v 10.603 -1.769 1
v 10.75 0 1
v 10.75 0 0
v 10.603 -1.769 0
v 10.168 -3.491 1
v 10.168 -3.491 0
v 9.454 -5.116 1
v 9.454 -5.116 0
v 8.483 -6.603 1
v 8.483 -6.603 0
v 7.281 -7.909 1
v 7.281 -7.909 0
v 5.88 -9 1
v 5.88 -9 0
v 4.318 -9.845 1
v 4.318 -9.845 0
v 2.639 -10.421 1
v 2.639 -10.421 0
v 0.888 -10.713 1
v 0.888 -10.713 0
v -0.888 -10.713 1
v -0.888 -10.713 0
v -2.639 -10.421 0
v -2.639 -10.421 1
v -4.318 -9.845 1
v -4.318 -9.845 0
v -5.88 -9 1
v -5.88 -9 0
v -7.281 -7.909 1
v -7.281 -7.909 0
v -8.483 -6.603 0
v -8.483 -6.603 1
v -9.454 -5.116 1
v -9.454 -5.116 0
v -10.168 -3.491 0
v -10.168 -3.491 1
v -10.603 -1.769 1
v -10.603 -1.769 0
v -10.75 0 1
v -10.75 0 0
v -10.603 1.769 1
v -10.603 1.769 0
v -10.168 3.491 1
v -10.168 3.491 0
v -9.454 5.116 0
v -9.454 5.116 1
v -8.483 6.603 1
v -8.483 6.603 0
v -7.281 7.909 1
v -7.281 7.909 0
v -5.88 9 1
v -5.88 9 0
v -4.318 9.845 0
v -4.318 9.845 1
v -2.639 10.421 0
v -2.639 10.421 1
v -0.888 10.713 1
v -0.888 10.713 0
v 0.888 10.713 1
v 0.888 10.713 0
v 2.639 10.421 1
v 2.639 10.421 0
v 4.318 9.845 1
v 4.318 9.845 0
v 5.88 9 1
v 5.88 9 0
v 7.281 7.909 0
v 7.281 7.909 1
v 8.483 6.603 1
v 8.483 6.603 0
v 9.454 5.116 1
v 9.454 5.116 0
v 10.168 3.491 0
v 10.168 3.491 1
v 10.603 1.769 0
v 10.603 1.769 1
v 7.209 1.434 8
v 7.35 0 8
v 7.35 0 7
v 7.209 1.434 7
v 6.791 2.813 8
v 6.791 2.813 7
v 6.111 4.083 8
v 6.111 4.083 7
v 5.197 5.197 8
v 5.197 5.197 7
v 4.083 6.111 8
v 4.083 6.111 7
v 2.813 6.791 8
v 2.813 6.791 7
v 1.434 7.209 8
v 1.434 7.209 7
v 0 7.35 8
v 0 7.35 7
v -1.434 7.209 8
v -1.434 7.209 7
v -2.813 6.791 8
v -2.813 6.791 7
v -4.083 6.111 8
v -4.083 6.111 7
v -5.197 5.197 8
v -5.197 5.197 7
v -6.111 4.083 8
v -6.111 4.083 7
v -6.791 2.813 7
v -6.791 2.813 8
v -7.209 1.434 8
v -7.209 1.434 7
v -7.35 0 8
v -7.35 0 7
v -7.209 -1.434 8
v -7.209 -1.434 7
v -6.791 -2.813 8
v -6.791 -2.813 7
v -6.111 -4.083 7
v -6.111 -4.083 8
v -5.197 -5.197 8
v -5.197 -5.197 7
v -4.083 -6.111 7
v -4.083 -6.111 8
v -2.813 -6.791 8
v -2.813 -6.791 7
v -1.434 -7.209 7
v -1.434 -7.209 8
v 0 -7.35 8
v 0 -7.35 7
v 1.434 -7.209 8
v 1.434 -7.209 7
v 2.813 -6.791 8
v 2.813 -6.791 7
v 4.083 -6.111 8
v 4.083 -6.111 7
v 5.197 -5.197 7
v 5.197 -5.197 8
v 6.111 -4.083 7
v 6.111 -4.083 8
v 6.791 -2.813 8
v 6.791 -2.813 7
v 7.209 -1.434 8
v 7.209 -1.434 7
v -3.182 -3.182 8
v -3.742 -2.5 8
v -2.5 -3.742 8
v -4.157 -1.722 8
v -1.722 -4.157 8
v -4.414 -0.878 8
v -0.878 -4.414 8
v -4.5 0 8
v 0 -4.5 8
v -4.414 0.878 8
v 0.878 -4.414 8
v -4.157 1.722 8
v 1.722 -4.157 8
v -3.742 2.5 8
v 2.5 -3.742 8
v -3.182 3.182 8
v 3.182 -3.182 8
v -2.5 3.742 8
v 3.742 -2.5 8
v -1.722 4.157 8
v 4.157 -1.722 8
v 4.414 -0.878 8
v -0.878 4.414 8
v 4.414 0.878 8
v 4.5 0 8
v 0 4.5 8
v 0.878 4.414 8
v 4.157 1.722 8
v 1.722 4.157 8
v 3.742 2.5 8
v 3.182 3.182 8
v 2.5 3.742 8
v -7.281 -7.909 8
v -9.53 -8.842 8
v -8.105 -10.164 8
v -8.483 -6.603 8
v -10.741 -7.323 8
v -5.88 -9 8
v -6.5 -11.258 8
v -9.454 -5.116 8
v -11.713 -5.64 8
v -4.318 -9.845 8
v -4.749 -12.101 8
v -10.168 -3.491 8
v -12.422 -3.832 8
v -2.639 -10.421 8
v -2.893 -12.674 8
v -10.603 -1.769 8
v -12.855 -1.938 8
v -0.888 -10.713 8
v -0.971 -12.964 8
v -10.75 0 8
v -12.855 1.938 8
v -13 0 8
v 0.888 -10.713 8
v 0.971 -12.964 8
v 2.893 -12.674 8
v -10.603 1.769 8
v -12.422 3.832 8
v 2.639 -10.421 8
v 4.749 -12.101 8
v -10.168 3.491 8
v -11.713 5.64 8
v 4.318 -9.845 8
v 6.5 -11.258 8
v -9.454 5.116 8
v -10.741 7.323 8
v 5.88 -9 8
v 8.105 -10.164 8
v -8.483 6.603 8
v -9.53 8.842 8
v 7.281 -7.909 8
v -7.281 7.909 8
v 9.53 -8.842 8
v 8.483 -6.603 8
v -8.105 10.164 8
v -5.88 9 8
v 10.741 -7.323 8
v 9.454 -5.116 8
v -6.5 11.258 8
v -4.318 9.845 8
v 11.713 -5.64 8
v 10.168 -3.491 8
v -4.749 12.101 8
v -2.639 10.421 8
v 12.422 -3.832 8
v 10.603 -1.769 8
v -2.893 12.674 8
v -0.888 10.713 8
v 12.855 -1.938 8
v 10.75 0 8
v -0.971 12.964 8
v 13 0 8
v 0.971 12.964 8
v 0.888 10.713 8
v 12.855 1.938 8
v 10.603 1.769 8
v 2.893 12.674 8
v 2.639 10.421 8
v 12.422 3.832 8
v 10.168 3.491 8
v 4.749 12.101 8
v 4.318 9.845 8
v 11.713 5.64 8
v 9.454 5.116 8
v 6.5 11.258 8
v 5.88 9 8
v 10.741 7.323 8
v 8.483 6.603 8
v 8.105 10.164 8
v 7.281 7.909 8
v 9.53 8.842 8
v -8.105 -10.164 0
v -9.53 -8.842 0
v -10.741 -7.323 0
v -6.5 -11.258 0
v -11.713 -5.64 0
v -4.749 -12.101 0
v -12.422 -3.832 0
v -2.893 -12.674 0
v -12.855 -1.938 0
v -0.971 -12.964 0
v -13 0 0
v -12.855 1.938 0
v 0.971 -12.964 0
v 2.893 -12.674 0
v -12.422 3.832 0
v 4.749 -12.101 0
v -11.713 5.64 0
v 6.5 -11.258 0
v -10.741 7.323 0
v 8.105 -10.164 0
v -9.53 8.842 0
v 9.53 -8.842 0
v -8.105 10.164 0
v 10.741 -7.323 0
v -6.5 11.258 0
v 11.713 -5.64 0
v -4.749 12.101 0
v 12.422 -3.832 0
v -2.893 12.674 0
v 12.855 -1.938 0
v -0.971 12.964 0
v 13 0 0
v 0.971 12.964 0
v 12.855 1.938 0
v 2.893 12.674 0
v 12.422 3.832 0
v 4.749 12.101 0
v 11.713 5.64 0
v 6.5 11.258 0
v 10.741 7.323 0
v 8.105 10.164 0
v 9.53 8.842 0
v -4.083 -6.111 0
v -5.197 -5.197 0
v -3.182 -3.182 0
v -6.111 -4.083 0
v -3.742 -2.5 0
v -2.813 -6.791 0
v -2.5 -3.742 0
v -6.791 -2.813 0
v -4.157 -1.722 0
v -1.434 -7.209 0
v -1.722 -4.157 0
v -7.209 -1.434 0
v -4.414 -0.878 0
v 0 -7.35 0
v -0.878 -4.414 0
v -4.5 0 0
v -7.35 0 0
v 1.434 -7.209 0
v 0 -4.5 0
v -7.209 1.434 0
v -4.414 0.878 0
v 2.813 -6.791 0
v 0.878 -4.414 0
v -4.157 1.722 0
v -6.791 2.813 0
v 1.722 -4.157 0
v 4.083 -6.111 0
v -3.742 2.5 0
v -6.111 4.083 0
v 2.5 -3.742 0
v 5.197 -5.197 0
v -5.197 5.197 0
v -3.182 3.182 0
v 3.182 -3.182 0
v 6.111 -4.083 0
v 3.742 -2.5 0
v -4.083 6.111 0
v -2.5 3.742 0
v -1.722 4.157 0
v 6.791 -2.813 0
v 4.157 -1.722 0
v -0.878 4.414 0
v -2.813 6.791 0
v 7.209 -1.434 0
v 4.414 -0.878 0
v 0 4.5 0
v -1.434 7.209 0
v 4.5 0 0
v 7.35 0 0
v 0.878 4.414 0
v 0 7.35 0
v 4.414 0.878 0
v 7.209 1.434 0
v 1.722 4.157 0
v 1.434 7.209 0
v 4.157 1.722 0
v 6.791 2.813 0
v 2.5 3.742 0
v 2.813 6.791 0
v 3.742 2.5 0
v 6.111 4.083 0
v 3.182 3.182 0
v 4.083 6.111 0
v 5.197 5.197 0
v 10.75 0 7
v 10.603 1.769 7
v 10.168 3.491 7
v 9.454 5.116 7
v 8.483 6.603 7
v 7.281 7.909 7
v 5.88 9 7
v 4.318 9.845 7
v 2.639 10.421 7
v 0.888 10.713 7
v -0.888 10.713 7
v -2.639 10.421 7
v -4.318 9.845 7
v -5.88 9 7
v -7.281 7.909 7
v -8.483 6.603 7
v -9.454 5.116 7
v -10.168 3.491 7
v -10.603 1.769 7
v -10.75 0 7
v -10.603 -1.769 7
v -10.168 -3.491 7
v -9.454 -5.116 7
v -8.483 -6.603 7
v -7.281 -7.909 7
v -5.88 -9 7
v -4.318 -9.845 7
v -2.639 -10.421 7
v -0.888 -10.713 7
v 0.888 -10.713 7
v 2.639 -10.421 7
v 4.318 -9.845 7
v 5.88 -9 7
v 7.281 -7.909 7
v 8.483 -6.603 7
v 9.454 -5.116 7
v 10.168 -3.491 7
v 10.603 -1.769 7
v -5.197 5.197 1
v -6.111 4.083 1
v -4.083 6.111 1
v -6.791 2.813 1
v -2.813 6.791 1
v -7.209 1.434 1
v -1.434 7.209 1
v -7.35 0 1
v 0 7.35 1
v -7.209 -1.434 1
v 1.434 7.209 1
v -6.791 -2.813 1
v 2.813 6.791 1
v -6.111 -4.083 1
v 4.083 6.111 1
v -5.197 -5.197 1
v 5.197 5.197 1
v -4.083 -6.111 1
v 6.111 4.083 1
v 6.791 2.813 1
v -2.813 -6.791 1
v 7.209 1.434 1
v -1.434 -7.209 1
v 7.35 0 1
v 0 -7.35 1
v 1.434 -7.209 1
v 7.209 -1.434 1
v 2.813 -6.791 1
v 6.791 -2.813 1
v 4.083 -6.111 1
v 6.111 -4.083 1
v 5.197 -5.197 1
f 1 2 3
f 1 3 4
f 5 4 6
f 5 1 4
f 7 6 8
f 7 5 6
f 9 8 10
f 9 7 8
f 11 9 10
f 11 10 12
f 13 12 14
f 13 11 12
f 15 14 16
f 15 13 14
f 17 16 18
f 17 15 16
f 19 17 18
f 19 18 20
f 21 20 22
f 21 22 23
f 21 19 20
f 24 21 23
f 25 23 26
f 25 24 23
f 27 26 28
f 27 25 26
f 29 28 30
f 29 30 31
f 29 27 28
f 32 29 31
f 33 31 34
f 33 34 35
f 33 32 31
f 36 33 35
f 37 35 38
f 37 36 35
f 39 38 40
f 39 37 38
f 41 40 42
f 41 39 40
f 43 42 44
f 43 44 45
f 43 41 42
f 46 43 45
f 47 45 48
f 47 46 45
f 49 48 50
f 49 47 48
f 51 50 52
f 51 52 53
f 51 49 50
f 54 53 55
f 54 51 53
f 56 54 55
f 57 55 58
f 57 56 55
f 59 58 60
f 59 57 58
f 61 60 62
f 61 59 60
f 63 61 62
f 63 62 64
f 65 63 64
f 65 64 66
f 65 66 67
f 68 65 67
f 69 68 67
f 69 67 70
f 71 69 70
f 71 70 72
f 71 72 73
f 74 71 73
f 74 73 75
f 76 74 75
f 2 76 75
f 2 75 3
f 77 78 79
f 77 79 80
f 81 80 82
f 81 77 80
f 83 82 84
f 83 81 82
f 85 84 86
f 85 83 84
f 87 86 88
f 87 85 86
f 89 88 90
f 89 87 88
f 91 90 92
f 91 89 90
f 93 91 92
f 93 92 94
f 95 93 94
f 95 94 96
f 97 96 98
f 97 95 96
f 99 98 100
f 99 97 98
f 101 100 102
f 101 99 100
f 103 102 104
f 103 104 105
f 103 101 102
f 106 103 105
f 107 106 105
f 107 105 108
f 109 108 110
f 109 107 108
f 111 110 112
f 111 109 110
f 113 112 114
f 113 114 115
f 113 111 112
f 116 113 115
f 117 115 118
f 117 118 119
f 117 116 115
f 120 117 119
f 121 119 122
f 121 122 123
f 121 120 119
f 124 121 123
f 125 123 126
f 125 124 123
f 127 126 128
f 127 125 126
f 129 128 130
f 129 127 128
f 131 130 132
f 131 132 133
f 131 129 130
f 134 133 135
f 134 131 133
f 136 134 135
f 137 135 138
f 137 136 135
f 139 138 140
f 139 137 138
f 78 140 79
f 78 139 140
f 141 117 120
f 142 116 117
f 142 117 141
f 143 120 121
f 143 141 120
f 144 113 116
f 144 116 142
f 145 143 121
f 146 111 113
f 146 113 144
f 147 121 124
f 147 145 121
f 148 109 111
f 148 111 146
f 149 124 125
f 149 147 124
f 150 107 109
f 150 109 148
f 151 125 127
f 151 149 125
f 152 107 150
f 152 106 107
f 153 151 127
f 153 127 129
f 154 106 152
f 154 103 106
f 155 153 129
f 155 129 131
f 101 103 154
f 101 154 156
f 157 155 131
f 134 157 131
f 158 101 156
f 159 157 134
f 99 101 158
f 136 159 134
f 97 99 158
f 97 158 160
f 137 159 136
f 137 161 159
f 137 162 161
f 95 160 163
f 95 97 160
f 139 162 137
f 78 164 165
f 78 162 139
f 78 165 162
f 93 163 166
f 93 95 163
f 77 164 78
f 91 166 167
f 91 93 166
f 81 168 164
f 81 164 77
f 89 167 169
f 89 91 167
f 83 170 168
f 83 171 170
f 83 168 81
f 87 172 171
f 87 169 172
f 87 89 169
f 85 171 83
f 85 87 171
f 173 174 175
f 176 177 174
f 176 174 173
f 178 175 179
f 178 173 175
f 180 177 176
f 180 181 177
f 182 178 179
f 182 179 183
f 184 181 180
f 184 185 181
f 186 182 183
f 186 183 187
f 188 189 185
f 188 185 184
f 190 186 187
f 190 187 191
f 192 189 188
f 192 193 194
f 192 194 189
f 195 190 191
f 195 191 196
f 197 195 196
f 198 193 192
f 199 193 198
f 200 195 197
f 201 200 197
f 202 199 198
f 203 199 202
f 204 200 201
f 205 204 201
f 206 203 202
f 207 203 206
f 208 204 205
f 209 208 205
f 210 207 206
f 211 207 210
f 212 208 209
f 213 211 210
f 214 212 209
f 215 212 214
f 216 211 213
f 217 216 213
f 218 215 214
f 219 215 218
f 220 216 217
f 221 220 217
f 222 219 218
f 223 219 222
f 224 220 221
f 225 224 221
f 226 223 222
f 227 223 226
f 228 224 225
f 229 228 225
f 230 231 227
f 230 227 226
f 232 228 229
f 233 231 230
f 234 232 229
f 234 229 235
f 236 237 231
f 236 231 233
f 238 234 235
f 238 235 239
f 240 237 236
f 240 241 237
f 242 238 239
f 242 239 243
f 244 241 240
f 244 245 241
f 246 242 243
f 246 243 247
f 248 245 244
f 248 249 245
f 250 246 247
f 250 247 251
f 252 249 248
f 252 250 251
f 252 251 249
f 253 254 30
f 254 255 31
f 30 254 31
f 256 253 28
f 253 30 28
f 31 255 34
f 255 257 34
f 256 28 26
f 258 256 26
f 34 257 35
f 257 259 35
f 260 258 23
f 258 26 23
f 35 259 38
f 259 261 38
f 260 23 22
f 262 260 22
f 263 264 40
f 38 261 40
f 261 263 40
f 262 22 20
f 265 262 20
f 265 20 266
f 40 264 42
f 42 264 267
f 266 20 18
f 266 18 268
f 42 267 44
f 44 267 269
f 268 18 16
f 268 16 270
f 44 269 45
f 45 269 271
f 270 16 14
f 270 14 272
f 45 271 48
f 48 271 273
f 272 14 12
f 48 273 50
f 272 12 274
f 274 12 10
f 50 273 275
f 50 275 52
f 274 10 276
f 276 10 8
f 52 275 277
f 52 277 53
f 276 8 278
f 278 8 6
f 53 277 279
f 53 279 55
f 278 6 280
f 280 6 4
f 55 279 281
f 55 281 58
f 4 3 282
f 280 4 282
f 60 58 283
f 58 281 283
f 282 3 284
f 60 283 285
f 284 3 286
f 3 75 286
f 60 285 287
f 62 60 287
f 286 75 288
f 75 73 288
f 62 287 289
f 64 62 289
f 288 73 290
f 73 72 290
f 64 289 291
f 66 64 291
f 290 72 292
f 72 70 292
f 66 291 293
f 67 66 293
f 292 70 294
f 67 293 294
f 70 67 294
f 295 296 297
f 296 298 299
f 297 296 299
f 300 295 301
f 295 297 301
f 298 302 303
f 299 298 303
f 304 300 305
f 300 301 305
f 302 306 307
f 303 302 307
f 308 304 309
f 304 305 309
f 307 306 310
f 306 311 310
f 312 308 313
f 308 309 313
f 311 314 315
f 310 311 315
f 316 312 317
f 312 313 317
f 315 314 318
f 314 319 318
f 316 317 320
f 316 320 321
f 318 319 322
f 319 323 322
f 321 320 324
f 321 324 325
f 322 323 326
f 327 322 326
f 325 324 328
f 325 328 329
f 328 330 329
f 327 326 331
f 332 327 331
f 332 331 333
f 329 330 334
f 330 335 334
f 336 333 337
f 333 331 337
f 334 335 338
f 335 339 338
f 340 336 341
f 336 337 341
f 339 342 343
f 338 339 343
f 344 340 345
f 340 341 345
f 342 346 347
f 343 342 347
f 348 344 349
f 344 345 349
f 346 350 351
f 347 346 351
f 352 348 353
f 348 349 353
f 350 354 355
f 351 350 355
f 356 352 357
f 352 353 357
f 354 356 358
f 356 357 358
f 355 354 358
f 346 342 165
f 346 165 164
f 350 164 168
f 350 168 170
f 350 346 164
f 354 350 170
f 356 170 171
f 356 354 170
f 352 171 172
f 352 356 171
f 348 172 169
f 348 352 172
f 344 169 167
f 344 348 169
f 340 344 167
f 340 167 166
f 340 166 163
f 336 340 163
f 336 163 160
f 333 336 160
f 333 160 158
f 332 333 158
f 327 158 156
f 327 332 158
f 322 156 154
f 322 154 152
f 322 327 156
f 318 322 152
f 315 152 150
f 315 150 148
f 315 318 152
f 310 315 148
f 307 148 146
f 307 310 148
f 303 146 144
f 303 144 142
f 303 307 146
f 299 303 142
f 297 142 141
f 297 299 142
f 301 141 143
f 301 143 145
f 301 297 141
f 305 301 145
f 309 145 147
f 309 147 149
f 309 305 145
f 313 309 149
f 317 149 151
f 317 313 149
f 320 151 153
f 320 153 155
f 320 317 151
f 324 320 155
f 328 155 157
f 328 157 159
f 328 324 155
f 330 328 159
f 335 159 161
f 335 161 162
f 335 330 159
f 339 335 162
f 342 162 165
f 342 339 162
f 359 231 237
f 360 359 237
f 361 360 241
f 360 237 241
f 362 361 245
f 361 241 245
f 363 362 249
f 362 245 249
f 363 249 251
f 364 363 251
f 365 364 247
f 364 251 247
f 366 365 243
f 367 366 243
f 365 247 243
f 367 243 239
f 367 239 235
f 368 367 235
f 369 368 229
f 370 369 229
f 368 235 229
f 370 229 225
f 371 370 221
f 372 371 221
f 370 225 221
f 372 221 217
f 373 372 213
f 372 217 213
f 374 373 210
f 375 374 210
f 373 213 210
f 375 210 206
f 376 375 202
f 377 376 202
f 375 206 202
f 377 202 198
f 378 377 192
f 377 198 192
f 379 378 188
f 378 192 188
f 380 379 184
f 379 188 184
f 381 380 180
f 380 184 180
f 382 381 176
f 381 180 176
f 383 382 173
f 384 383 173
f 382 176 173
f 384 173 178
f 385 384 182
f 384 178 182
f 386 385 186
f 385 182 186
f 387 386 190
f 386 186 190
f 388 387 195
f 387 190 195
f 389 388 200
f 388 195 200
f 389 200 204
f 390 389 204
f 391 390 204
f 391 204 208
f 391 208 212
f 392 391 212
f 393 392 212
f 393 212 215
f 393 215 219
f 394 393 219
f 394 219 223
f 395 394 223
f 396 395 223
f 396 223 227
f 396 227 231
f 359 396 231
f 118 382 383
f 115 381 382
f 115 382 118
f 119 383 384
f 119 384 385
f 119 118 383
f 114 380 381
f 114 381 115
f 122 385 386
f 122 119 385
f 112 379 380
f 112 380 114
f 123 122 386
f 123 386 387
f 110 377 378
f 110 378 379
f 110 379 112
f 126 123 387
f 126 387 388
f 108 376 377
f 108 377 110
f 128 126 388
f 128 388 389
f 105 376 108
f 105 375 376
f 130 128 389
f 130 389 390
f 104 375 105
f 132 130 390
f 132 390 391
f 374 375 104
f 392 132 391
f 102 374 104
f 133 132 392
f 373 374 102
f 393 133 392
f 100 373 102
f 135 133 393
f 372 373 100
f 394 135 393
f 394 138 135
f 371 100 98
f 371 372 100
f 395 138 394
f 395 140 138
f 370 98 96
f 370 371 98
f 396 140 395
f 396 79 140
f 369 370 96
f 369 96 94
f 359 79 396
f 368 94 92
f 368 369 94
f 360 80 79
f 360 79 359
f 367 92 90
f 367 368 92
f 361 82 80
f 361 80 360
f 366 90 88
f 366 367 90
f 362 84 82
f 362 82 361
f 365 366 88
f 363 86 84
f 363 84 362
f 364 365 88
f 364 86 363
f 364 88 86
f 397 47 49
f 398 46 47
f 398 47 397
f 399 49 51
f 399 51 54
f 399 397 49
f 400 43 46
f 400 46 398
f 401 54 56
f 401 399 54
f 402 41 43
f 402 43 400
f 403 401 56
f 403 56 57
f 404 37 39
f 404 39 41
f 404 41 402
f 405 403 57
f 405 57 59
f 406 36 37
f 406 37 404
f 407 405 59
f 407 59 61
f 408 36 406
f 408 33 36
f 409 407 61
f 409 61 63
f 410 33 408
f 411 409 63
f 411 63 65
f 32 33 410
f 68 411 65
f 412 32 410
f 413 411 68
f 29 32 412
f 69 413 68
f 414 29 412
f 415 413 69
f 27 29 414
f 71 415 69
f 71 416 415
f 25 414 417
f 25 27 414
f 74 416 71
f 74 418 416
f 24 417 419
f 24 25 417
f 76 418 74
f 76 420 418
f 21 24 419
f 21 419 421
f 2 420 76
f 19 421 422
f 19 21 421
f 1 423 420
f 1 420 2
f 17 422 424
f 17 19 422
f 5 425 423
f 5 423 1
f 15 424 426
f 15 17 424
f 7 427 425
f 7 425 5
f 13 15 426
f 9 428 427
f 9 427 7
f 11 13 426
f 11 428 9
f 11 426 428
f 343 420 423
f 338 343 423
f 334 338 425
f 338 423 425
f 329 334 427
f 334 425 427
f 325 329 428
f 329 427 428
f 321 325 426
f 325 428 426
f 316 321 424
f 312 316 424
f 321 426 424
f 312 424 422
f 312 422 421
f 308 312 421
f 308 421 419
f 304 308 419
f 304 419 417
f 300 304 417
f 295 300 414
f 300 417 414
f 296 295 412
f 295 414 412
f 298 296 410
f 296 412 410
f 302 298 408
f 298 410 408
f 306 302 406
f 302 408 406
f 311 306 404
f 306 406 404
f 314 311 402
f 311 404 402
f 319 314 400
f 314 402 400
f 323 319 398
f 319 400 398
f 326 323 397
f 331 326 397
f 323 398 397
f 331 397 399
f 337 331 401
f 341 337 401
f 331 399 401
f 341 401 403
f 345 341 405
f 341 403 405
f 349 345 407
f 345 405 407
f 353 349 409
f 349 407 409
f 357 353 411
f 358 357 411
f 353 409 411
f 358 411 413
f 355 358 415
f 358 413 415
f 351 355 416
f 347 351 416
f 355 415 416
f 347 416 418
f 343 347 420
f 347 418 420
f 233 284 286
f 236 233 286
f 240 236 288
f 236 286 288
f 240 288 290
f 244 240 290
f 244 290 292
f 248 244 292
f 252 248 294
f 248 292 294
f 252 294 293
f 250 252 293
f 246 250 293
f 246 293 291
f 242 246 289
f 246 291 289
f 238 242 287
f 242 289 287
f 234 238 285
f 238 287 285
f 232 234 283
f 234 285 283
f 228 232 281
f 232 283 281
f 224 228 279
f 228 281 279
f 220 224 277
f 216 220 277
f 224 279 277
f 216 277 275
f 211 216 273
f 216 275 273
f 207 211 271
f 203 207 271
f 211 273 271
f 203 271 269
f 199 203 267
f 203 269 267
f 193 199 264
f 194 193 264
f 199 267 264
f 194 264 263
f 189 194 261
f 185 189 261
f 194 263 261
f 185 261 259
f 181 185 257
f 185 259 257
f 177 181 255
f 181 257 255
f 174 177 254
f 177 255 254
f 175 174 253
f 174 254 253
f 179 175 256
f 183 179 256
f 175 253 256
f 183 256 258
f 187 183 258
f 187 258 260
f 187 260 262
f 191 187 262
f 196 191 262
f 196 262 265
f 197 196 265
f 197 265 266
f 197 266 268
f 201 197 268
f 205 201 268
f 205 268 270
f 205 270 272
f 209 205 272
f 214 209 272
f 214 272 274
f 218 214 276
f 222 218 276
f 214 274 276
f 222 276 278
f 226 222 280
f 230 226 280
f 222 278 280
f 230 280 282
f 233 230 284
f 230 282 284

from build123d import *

# Parameters (mm, degrees)
SKETCH_1_R          = 13
SKETCH_1_R_2        = 4.5
EXTRUDE_1_DEPTH     = 8
SKETCH_2_R          = 10.75
SKETCH_2_R_2        = 7.35
CUT_EXTRUDE_1_DEPTH = 1
CUT_EXTRUDE_START   = -1
SKETCH_3_R          = 10.75
SKETCH_3_R_2        = 7.35
CUT_EXTRUDE_2_DEPTH = 1


with BuildPart() as part:
    # Эскиз1 → Бобышка-Вытянуть1 (new body)
    with BuildSketch(Plane.XY):
        Circle(SKETCH_1_R)
        Circle(SKETCH_1_R_2, mode=Mode.SUBTRACT)
    extrude(amount=EXTRUDE_1_DEPTH)

    # Эскиз2 → Вырез-Вытянуть1 (cut)
    with BuildSketch(Plane.XY.offset(8)):
        Circle(SKETCH_2_R)
        Circle(SKETCH_2_R_2, mode=Mode.SUBTRACT)
    extrude(amount=-CUT_EXTRUDE_1_DEPTH, mode=Mode.SUBTRACT)

    # Эскиз3 → Вырез-Вытянуть2 (cut)
    with BuildSketch(Plane(origin=(0, 0, 0), x_dir=(-1, 0, 0), z_dir=(0, 0, -1)).offset(CUT_EXTRUDE_START)):
        with Locations(Location((0, 0, 0), (0, 0, 180))):
            Circle(SKETCH_3_R)
        with Locations(Location((0, 0, 0), (0, 0, 180))):
            Circle(SKETCH_3_R_2, mode=Mode.SUBTRACT)
    extrude(amount=CUT_EXTRUDE_2_DEPTH, mode=Mode.SUBTRACT)


solid = part.part
